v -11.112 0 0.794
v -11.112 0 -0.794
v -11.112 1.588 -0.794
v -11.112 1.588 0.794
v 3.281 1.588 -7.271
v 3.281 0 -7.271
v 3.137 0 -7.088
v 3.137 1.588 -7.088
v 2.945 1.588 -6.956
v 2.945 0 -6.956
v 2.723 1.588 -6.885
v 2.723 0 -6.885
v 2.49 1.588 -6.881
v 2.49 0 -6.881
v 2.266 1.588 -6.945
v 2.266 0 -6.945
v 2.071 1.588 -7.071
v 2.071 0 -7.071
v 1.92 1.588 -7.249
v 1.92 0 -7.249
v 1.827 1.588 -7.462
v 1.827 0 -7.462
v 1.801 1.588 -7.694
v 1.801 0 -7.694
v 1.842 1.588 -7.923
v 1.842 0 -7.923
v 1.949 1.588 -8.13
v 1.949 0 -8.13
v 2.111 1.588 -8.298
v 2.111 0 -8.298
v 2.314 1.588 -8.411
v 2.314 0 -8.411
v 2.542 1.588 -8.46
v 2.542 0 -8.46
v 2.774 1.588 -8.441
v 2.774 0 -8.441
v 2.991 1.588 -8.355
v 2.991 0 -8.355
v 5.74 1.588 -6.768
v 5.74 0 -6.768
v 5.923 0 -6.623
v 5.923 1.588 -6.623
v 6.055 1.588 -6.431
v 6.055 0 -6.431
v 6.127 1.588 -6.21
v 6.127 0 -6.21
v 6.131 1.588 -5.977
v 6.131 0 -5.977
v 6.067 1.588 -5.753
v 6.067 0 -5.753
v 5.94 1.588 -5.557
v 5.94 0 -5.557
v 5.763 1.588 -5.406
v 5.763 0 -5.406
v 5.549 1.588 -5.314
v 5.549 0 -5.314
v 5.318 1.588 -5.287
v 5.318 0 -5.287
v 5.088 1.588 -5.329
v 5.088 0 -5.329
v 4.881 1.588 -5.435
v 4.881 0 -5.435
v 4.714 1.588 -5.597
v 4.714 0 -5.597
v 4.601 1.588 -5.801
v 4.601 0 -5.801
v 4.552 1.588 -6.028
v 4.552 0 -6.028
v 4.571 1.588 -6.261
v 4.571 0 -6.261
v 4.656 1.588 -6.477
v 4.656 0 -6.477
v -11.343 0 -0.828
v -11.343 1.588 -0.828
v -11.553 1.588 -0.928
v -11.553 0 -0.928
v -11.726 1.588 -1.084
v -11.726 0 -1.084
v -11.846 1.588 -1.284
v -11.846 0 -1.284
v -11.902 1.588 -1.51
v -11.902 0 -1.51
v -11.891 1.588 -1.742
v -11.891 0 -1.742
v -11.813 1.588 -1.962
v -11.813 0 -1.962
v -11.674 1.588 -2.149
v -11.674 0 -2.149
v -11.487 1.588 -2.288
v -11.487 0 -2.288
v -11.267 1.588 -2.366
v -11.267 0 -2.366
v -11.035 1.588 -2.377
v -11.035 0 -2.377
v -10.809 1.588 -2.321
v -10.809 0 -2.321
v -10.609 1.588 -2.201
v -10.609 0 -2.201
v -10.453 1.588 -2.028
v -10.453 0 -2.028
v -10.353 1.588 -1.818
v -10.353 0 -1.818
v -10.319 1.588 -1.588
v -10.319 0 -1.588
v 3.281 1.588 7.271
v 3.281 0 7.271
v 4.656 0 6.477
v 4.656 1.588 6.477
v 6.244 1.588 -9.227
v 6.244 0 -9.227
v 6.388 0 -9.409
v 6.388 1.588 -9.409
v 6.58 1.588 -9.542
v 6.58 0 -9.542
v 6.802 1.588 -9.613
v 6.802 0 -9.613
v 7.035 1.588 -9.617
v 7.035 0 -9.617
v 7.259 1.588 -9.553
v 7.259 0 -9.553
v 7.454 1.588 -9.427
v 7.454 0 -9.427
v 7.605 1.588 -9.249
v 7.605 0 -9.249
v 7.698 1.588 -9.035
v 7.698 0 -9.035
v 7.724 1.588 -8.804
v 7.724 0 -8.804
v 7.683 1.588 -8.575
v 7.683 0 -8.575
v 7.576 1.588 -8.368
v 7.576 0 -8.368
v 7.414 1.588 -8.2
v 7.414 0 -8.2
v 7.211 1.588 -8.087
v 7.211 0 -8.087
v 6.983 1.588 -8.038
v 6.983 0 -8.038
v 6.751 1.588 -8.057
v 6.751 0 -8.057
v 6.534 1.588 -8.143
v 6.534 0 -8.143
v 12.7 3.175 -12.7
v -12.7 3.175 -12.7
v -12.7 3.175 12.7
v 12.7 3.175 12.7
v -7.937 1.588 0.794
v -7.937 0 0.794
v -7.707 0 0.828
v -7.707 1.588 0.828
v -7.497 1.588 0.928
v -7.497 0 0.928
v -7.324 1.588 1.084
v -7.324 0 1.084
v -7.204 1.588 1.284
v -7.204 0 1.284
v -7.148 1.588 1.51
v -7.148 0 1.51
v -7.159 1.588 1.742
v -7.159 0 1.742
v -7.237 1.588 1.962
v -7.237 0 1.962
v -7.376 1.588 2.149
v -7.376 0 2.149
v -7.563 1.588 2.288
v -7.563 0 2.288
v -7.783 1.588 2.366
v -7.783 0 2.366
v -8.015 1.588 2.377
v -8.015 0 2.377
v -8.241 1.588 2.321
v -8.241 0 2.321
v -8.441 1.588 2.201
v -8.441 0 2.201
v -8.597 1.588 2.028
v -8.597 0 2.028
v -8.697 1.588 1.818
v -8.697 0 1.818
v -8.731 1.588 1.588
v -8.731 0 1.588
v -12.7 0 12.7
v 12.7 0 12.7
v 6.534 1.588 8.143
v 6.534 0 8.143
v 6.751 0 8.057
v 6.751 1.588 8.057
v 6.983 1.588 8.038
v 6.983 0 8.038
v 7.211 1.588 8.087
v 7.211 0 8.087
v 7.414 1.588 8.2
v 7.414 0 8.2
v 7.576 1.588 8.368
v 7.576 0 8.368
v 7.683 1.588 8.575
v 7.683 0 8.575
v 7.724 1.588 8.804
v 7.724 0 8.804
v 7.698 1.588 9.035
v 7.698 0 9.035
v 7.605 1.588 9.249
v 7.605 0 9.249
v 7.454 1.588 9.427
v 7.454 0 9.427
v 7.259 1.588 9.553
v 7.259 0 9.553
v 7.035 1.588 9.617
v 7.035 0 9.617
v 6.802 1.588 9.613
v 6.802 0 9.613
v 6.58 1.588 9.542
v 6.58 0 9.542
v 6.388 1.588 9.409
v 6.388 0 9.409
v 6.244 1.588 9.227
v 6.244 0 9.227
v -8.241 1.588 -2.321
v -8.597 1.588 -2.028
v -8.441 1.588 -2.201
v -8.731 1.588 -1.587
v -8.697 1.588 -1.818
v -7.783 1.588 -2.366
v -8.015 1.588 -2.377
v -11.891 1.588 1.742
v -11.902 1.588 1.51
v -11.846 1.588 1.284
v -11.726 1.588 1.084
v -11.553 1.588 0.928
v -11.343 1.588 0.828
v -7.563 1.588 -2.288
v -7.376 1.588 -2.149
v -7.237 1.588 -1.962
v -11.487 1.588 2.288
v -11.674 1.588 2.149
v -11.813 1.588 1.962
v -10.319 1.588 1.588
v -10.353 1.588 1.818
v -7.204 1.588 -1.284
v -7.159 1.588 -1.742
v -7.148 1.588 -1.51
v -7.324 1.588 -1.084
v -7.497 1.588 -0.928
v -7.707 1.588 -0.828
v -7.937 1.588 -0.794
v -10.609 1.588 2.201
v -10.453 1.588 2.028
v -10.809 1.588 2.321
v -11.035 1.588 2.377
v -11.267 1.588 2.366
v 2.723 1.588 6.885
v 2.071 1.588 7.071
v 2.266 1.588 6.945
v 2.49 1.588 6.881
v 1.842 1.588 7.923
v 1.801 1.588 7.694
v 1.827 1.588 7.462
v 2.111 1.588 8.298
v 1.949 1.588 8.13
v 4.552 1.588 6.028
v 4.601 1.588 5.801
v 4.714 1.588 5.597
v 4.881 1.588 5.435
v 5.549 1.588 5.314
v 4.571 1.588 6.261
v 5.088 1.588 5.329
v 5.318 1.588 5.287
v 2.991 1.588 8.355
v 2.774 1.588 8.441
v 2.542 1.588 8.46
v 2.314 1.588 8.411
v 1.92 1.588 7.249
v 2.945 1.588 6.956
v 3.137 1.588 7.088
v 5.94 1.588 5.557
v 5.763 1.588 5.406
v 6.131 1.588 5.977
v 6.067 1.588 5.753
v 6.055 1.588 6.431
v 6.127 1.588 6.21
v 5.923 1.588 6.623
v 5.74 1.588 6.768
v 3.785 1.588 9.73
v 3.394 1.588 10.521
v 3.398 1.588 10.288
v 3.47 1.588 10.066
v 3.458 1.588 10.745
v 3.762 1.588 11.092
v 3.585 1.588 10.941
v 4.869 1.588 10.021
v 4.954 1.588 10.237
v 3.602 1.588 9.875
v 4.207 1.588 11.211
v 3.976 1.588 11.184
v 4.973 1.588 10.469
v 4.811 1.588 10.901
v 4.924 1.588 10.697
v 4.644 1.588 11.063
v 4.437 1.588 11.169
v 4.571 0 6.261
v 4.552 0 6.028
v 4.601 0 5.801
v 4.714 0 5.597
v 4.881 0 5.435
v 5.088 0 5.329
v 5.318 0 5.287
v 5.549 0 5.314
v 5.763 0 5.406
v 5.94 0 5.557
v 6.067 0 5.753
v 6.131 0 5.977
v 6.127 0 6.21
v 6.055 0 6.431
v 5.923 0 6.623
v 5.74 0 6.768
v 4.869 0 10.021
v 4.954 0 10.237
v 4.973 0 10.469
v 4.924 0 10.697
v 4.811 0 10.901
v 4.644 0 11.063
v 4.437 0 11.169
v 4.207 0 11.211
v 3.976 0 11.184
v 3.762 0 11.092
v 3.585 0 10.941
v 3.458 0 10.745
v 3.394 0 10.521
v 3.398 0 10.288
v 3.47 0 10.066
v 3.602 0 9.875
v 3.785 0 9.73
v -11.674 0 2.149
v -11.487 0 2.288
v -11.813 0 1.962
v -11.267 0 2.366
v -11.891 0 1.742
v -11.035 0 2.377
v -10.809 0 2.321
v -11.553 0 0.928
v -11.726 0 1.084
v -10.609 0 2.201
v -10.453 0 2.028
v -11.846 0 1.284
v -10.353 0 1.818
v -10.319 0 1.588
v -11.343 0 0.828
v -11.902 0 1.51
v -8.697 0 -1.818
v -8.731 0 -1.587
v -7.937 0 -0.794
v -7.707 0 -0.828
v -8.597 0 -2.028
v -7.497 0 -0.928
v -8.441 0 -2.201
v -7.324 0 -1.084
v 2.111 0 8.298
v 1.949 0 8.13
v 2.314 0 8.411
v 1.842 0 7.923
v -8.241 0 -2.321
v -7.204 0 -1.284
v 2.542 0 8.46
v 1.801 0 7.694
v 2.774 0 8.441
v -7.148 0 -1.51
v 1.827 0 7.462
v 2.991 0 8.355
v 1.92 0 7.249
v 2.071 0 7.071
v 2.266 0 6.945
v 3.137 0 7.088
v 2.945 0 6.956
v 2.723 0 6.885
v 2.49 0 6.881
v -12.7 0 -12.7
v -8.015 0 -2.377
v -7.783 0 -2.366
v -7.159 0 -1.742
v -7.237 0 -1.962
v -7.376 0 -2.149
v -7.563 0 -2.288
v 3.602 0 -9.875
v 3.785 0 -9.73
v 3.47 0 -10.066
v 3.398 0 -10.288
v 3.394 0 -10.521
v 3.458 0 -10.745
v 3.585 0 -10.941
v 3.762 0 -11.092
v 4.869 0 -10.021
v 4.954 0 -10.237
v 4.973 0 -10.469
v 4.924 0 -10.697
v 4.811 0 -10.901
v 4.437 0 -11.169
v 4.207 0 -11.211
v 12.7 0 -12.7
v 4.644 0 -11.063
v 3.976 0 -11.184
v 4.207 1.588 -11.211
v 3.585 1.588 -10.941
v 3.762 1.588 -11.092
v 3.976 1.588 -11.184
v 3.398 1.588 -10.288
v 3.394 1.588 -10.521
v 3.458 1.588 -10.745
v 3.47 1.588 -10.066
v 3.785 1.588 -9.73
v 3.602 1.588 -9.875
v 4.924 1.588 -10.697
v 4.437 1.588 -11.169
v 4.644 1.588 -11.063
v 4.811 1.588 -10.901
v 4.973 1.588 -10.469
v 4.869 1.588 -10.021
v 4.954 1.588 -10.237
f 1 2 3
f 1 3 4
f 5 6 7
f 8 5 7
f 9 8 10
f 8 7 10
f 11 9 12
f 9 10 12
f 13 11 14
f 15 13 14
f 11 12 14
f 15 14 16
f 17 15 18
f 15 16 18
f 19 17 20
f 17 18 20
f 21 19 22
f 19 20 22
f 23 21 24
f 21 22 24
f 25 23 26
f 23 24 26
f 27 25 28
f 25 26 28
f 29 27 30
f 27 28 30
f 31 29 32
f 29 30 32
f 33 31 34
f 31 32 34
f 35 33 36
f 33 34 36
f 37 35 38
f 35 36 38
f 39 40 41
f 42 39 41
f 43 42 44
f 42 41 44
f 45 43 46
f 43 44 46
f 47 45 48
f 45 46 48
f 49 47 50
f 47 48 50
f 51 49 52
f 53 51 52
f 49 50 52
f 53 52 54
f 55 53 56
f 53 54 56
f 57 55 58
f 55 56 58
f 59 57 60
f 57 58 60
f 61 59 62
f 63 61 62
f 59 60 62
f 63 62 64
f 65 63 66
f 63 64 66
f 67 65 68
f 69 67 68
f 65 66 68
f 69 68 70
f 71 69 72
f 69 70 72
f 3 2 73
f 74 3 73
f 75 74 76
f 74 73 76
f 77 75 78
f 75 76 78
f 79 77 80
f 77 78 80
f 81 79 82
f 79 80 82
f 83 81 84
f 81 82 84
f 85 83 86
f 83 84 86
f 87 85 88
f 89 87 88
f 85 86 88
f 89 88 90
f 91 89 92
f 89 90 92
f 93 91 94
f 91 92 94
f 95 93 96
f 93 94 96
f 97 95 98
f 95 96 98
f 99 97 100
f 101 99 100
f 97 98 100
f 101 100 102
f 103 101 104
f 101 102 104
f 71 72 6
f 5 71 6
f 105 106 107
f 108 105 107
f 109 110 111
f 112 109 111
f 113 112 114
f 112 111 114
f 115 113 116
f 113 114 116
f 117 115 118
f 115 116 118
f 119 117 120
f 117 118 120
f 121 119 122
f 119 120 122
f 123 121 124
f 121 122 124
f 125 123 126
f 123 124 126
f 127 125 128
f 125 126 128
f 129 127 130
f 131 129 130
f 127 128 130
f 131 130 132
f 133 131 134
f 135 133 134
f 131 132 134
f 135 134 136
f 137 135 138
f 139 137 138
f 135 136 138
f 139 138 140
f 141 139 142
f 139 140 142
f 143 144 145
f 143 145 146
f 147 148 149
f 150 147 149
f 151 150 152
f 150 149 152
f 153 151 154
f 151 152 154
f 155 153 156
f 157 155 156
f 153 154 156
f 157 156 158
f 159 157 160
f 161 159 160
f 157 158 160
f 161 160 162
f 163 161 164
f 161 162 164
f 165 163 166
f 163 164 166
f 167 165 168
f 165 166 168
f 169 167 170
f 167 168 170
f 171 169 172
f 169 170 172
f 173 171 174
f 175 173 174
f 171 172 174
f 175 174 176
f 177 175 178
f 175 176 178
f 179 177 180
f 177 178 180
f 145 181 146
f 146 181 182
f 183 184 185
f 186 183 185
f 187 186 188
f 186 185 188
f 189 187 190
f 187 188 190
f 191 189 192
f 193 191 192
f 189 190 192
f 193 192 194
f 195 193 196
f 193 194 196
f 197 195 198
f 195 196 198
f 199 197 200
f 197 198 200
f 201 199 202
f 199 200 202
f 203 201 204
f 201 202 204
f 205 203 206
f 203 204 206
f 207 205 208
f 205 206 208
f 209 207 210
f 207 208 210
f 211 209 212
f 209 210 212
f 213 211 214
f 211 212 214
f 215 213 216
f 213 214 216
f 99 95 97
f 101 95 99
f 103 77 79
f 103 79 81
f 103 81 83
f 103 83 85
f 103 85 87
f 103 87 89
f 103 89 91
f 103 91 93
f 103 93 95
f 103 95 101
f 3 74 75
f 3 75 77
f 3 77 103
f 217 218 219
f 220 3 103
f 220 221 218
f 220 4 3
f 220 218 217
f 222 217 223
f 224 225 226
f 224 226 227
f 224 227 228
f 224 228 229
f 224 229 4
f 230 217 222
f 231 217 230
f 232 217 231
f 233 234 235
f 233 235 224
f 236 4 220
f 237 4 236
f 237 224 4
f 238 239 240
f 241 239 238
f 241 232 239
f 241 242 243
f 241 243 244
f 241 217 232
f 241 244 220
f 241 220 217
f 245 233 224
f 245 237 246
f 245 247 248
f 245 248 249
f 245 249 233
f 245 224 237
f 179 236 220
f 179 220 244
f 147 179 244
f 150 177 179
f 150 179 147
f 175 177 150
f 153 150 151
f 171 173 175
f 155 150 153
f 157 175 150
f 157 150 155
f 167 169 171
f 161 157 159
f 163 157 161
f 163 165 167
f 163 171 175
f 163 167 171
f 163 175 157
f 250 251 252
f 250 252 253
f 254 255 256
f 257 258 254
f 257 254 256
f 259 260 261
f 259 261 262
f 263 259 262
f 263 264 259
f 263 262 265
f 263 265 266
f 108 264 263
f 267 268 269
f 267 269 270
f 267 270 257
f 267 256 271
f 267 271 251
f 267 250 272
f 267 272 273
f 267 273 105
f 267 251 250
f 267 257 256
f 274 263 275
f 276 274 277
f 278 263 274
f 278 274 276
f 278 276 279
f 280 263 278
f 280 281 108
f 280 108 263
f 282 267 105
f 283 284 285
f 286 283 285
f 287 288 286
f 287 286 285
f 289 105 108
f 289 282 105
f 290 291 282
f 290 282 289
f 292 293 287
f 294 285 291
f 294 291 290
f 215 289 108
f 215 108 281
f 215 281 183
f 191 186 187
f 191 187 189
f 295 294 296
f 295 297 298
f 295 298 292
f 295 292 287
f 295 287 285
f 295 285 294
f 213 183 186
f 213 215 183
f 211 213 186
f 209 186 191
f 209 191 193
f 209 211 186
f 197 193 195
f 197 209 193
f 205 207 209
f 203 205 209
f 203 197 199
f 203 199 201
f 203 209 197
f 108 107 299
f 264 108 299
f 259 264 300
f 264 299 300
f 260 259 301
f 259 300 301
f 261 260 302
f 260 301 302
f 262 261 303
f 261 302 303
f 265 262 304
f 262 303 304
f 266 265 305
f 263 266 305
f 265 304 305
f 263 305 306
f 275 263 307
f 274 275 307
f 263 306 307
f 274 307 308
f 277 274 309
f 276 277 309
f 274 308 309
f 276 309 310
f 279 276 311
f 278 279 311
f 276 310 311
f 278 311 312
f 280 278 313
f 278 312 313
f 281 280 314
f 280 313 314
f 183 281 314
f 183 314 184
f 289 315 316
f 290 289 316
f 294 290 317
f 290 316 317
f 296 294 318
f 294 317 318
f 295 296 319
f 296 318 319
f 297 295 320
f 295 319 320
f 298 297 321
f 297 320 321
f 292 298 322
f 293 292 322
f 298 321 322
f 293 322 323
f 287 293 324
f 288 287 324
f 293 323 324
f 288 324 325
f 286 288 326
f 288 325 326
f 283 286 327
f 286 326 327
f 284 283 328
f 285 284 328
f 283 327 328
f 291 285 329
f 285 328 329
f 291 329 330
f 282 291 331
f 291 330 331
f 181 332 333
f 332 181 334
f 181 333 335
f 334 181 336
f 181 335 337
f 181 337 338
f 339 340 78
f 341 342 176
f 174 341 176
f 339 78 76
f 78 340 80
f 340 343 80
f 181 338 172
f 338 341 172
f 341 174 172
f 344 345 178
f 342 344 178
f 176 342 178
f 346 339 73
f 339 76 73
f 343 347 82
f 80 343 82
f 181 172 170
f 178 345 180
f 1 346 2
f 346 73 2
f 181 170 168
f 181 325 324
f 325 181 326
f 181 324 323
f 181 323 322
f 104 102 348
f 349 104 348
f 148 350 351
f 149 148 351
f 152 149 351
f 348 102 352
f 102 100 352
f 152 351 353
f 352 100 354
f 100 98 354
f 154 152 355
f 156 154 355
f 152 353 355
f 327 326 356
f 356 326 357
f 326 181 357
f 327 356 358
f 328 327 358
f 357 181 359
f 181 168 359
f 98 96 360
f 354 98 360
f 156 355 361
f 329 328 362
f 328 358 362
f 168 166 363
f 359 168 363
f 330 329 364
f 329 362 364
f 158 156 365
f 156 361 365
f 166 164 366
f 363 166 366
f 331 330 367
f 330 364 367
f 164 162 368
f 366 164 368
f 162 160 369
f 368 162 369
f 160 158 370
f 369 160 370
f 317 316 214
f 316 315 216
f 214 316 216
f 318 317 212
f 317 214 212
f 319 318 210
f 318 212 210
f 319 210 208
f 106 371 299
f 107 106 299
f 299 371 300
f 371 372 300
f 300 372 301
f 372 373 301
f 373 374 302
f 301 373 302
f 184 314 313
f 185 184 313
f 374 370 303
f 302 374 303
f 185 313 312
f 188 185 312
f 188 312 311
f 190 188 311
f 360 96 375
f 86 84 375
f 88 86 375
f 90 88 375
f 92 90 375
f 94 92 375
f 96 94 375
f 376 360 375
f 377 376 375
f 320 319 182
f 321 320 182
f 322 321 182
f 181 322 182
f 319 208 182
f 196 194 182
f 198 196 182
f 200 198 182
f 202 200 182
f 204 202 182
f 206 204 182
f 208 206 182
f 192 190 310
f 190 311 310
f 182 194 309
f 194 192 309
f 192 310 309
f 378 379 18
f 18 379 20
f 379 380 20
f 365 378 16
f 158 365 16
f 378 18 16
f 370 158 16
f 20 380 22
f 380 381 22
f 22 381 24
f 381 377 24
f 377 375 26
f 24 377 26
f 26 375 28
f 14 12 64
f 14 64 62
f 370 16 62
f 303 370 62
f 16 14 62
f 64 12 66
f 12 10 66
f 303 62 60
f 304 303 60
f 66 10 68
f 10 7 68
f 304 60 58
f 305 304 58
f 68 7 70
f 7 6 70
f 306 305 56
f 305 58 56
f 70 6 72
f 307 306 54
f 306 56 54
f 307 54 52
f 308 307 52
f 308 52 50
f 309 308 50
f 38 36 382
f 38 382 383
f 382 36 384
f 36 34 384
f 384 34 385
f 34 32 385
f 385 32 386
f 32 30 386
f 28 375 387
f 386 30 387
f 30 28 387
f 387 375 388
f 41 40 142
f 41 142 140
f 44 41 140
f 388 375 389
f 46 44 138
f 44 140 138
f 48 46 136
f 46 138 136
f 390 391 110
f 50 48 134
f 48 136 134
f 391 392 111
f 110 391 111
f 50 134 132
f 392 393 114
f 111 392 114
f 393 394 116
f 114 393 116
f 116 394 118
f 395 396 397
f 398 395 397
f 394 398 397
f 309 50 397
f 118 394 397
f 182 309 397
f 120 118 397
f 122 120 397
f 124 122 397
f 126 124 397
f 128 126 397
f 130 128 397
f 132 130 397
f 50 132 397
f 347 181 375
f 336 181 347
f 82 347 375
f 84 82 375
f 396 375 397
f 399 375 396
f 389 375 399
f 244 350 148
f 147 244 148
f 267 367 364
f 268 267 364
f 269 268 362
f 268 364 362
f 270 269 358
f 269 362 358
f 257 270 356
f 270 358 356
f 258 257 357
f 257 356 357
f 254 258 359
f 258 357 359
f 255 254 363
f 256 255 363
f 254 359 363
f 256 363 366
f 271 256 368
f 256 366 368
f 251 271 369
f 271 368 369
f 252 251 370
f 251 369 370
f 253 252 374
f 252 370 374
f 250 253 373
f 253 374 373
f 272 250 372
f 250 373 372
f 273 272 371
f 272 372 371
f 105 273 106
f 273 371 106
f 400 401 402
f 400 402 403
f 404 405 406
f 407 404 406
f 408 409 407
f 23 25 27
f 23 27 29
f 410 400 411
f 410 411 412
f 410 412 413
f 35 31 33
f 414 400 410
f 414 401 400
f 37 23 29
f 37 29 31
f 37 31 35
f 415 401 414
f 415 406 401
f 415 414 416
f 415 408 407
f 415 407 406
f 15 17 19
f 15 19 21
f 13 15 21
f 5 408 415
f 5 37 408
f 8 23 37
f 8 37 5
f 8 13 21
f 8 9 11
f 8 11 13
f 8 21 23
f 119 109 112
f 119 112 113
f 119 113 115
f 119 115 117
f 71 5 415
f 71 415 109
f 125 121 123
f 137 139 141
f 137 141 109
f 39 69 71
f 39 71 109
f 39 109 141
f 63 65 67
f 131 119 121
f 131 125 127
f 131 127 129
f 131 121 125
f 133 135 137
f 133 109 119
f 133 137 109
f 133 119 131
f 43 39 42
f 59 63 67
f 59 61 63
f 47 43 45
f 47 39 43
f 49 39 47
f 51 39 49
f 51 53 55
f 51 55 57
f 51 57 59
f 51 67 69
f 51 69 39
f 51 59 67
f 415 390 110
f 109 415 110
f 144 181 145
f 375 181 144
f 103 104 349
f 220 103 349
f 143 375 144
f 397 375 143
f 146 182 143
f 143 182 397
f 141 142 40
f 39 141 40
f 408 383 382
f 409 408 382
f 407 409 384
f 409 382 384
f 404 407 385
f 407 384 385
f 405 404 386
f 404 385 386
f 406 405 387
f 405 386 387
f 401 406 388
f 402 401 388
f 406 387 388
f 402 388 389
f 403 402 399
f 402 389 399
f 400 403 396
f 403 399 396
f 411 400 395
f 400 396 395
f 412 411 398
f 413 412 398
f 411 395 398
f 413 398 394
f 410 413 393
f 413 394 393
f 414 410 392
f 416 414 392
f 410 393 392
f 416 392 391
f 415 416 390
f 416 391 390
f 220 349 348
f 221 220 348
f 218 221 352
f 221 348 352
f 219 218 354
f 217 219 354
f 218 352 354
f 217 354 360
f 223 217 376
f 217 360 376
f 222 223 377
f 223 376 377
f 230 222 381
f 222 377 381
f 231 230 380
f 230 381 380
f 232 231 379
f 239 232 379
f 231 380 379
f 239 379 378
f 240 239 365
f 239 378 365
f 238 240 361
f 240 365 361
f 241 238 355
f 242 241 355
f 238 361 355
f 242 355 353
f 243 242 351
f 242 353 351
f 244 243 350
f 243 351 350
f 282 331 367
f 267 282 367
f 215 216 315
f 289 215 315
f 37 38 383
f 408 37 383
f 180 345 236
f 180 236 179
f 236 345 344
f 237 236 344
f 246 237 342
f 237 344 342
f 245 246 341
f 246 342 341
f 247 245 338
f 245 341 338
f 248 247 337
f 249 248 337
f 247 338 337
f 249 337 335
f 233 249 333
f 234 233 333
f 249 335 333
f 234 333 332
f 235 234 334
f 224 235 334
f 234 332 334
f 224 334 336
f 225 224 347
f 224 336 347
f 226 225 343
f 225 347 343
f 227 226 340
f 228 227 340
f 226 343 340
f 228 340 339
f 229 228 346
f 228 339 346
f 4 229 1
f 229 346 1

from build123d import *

# Parameters (mm, degrees)
SKETCH1_W           = 25.4
SKETCH1_H           = 25.4
BOSS_EXTRUDE1_DEPTH = 3.175
SKETCH2_R           = 0.79375
SKETCH2_W           = 3.175
SKETCH2_H           = 3.175
CUT_EXTRUDE1_DEPTH  = 1.5875


with BuildPart() as part:
    # Sketch1 → Boss-Extrude1 (new body)
    with BuildSketch(Plane(origin=(0, 0, 0), x_dir=(1, 0, 0), z_dir=(0, 1, 0))):
        Rectangle(SKETCH1_W, SKETCH1_H)
    extrude(amount=BOSS_EXTRUDE1_DEPTH)

    # Sketch2 → Cut-Extrude1 (cut)
    with BuildSketch(Plane.XZ):
        with Locations((-11.1125, -1.5875)):
            Circle(SKETCH2_R)
        with Locations((-11.1125, 1.5875)):
            Circle(SKETCH2_R)
        with Locations((-7.9375, 1.5875)):
            Circle(SKETCH2_R)
        with Locations((-7.9375, -1.5875)):
            Circle(SKETCH2_R)
        with Locations((4.181434671, 10.4174573)):
            Circle(SKETCH2_R)
        with Locations((6.931065329, 8.8299573)):
            Circle(SKETCH2_R)
        with Locations((5.343565329, 6.080326643)):
            Circle(SKETCH2_R)
        with Locations((2.593934671, 7.667826643)):
            Circle(SKETCH2_R)
        with Locations((6.931065329, -8.8299573)):
            Circle(SKETCH2_R)
        with Locations((4.181434671, -10.4174573)):
            Circle(SKETCH2_R)
        with Locations((2.593934671, -7.667826643)):
            Circle(SKETCH2_R)
        with Locations((5.343565329, -6.080326643)):
            Circle(SKETCH2_R)
        with Locations((-9.525, 0)):
            Rectangle(SKETCH2_W, SKETCH2_H)
        Polygon((6.931065329, 8.8299573), (4.181434671, 10.4174573), (2.593934671, 7.667826643), (5.343565329, 6.080326643), align=None)
        Polygon((4.181434671, -10.4174573), (6.931065329, -8.8299573), (5.343565329, -6.080326643), (2.593934671, -7.667826643), align=None)
    extrude(amount=-CUT_EXTRUDE1_DEPTH, mode=Mode.SUBTRACT)


solid = part.part
